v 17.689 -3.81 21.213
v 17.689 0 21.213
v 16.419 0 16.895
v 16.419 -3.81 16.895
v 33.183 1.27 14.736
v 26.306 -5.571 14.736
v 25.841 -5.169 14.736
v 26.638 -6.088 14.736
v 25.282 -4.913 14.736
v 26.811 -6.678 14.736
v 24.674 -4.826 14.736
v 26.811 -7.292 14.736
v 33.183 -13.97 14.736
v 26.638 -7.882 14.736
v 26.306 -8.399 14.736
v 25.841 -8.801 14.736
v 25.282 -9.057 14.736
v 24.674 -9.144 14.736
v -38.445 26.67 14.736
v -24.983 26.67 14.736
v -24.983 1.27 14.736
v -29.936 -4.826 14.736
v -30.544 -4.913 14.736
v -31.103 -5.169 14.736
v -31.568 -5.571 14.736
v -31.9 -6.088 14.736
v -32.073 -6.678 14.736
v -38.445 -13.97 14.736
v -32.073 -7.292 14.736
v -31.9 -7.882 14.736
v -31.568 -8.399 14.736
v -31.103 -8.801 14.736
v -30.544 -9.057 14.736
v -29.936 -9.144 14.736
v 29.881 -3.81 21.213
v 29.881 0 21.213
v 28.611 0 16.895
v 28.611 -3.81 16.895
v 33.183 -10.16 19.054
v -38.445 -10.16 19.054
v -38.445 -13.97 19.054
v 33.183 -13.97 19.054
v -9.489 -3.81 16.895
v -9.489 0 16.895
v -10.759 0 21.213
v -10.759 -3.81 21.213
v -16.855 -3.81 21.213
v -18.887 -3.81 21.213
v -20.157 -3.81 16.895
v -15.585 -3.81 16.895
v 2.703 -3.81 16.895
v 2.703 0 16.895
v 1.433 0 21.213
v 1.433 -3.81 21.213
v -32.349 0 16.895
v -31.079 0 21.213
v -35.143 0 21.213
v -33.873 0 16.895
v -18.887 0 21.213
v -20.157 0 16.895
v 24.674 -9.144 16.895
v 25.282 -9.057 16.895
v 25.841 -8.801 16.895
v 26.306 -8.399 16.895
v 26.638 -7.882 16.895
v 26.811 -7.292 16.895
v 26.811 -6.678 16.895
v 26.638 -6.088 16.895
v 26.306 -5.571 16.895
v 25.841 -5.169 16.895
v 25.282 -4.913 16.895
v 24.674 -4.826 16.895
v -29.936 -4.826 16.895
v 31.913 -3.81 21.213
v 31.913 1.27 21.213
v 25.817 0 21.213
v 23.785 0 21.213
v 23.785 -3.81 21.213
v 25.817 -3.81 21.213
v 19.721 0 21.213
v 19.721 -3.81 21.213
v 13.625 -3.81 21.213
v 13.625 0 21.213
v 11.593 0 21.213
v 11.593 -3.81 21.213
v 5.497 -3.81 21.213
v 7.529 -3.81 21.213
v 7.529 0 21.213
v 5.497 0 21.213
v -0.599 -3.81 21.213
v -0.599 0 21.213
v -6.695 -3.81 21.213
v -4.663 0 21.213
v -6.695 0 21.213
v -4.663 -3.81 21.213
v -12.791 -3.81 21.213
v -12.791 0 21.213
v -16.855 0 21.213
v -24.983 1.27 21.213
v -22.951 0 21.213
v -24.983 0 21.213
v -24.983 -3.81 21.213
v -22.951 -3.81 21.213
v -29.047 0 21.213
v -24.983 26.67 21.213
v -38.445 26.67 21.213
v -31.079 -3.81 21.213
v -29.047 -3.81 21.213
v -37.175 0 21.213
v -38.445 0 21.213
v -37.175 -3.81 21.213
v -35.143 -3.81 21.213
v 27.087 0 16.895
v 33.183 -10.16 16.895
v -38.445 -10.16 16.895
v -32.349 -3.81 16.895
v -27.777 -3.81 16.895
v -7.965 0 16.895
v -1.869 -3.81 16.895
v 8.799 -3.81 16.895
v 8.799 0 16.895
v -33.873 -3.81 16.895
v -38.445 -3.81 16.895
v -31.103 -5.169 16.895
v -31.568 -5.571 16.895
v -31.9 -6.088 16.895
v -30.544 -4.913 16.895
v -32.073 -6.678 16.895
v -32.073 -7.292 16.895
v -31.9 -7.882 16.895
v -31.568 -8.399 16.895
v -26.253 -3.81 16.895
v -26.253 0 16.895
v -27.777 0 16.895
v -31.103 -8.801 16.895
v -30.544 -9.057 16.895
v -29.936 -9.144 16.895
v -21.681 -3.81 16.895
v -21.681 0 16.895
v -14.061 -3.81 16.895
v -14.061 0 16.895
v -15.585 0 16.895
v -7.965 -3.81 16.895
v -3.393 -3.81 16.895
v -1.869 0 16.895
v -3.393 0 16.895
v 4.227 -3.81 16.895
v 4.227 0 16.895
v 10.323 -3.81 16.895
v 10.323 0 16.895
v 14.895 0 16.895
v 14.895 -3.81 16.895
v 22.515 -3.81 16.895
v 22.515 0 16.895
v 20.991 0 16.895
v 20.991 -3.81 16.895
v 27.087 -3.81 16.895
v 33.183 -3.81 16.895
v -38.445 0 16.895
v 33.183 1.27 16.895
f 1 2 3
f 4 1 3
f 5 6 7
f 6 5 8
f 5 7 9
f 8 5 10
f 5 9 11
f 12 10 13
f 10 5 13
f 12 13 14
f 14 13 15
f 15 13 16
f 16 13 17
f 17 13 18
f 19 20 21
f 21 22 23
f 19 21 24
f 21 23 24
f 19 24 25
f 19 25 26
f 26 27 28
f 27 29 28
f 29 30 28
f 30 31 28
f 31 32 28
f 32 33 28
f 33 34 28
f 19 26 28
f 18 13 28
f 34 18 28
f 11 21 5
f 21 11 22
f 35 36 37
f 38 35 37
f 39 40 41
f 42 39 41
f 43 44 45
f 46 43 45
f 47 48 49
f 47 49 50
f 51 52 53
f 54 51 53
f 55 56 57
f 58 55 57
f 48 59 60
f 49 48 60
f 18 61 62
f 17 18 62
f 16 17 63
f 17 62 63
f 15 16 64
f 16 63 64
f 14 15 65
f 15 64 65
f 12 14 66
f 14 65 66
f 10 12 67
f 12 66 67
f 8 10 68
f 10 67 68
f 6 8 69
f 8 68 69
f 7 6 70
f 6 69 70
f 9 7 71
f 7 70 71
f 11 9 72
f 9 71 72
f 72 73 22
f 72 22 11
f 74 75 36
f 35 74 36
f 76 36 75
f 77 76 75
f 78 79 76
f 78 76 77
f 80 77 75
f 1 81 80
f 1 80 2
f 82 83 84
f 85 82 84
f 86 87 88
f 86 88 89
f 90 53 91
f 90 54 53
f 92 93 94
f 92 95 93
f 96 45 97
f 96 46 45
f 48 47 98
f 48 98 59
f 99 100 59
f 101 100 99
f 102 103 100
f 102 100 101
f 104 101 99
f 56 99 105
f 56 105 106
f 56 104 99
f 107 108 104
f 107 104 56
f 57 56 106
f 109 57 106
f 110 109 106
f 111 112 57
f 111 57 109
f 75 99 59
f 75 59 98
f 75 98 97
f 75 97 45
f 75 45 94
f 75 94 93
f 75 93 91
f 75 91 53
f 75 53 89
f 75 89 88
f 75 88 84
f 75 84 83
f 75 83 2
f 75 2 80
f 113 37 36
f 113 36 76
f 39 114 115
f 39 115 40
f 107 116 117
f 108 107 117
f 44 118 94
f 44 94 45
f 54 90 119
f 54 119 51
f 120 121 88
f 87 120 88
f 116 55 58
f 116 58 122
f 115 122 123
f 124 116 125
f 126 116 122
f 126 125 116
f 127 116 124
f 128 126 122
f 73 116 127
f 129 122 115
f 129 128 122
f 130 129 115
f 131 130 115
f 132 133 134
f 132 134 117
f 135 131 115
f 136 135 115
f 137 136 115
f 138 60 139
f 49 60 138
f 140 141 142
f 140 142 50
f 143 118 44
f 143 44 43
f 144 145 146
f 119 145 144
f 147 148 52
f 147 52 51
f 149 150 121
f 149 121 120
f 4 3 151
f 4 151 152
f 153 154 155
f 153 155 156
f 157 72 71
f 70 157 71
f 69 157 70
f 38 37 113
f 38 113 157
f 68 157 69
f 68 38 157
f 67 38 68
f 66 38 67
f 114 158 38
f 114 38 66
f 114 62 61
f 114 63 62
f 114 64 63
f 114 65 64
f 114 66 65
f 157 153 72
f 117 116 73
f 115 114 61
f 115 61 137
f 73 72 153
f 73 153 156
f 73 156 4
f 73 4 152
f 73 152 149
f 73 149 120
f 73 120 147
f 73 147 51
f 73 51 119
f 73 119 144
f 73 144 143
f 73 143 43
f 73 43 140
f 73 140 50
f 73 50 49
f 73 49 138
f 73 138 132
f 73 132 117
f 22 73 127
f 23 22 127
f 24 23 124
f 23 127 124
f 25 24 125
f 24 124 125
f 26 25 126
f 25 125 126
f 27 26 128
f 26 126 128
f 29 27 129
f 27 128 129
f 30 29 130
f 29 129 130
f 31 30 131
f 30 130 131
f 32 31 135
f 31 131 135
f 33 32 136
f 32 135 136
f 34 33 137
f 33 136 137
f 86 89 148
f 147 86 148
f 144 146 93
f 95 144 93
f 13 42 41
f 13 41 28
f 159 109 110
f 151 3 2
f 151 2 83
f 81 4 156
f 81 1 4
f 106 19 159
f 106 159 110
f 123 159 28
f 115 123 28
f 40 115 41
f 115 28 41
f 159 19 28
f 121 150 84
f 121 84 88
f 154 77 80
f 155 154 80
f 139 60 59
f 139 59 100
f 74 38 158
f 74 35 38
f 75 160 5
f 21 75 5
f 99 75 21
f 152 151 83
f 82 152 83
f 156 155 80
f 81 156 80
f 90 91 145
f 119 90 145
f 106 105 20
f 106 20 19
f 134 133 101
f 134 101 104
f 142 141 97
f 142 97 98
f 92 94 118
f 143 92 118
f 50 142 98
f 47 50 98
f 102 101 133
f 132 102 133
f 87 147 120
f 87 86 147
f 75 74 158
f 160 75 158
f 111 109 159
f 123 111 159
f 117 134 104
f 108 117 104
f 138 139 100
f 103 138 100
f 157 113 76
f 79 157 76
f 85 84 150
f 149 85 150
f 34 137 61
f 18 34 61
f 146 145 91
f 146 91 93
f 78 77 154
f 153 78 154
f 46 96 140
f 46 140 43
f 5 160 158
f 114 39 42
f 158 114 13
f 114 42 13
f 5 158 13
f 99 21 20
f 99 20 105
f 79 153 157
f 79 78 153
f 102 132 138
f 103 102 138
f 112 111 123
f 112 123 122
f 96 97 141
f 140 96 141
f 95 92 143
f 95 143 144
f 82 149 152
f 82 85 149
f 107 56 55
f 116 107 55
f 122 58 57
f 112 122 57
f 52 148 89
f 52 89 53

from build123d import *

# Parameters (mm, degrees)
F1_DEPTH  = 3.81
F4_DEPTH  = 71.628
F6_DEPTH  = 1.27
F7_W      = 13.462
F7_H      = 6.477
F8_DEPTH  = 25.4
F9_W      = 54.61
F9_H      = 4.318
F10_DEPTH = 25.4


with BuildPart() as f1:
    # F0 (on Front) → F1 (new body)
    with BuildSketch(Plane.XZ):
        Polygon((-38.4448663006, 16.8945933835), (-38.4448663006, 14.7355933835), (33.1831336994, 14.7355933835), (33.1831336994, 16.8945933835), (28.6111336994, 16.8945933835), (27.0871336994, 16.8945933835), (22.5151336994, 16.8945933835), (20.9911336994, 16.8945933835), (16.4191336994, 16.8945933835), (14.8951336994, 16.8945933835), (10.3231336994, 16.8945933835), (8.7991336994, 16.8945933835), (4.2271336994, 16.8945933835), (2.7031336994, 16.8945933835), (-1.8688663006, 16.8945933835), (-3.3928663006, 16.8945933835), (-7.9648663006, 16.8945933835), (-9.4888663006, 16.8945933835), (-14.0608663006, 16.8945933835), (-15.5848663006, 16.8945933835), (-20.1568663006, 16.8945933835), (-21.6808663006, 16.8945933835), (-26.2528663006, 16.8945933835), (-27.7768663006, 16.8945933835), (-32.3488663006, 16.8945933835), (-33.8728663006, 16.8945933835), align=None)
        Polygon((-37.1748663006, 21.2125933835), (-38.4448663006, 16.8945933835), (-33.8728663006, 16.8945933835), (-35.1428663006, 21.2125933835), align=None)
        Polygon((28.6111336994, 16.8945933835), (33.1831336994, 16.8945933835), (31.9131336994, 21.2125933835), (29.8811336994, 21.2125933835), align=None)
        Polygon((-31.0788663006, 21.2125933835), (-32.3488663006, 16.8945933835), (-27.7768663006, 16.8945933835), (-29.0468663006, 21.2125933835), align=None)
        Polygon((22.5151336994, 16.8945933835), (27.0871336994, 16.8945933835), (25.8171336994, 21.2125933835), (23.7851336994, 21.2125933835), align=None)
        Polygon((-24.9828663006, 21.2125933835), (-26.2528663006, 16.8945933835), (-21.6808663006, 16.8945933835), (-22.9508663006, 21.2125933835), align=None)
        Polygon((16.4191336994, 16.8945933835), (20.9911336994, 16.8945933835), (19.7211336994, 21.2125933835), (17.6891336994, 21.2125933835), align=None)
        Polygon((-18.8868663006, 21.2125933835), (-20.1568663006, 16.8945933835), (-15.5848663006, 16.8945933835), (-16.8548663006, 21.2125933835), align=None)
        Polygon((10.3231336994, 16.8945933835), (14.8951336994, 16.8945933835), (13.6251336994, 21.2125933835), (11.5931336994, 21.2125933835), align=None)
        Polygon((-12.7908663006, 21.2125933835), (-14.0608663006, 16.8945933835), (-9.4888663006, 16.8945933835), (-10.7588663006, 21.2125933835), align=None)
        Polygon((4.2271336994, 16.8945933835), (8.7991336994, 16.8945933835), (7.5291336994, 21.2125933835), (5.4971336994, 21.2125933835), align=None)
        Polygon((-6.6948663006, 21.2125933835), (-7.9648663006, 16.8945933835), (-3.3928663006, 16.8945933835), (-4.6628663006, 21.2125933835), align=None)
        Polygon((-1.8688663006, 16.8945933835), (2.7031336994, 16.8945933835), (1.4331336994, 21.2125933835), (-0.5988663006, 21.2125933835), align=None)
    extrude(amount=F1_DEPTH)

    # F3 (on plane+point) → F4 (join, through all)
    with BuildSketch(Plane.YZ.offset(33.1831336994)):
        Polygon((-13.97, 14.7355933835), (-3.81, 14.7355933835), (-3.81, 16.8945933835), (-10.16, 16.8945933835), (-10.16, 19.0535933835), (-13.97, 19.0535933835), (-13.97, 16.8945933835), align=None)
    extrude(amount=-F4_DEPTH)

    # F5 (on face) → F6 (join)
    with BuildSketch(Plane(origin=(0, 0, 0), x_dir=(-1, 0, 0), z_dir=(0, 1, 0))):
        Polygon((33.8728663006, 16.8945933835), (35.1428663006, 21.2125933835), (31.0788663006, 21.2125933835), (32.3488663006, 16.8945933835), align=None)
        Polygon((27.7768663006, 16.8945933835), (29.0468663006, 21.2125933835), (24.9828663006, 21.2125933835), (26.2528663006, 16.8945933835), align=None)
        Polygon((21.6808663006, 16.8945933835), (22.9508663006, 21.2125933835), (18.8868663006, 21.2125933835), (20.1568663006, 16.8945933835), align=None)
        Polygon((15.5848663006, 16.8945933835), (16.8548663006, 21.2125933835), (12.7908663006, 21.2125933835), (14.0608663006, 16.8945933835), align=None)
        Polygon((9.4888663006, 16.8945933835), (10.7588663006, 21.2125933835), (6.6948663006, 21.2125933835), (7.9648663006, 16.8945933835), align=None)
        Polygon((3.3928663006, 16.8945933835), (4.6628663006, 21.2125933835), (0.5988663006, 21.2125933835), (1.8688663006, 16.8945933835), align=None)
        Polygon((-1.4331336994, 21.2125933835), (-5.4971336994, 21.2125933835), (-4.2271336994, 16.8945933835), (-2.7031336994, 16.8945933835), align=None)
        Polygon((-7.5291336994, 21.2125933835), (-11.5931336994, 21.2125933835), (-10.3231336994, 16.8945933835), (-8.7991336994, 16.8945933835), align=None)
        Polygon((-13.6251336994, 21.2125933835), (-17.6891336994, 21.2125933835), (-16.4191336994, 16.8945933835), (-14.8951336994, 16.8945933835), align=None)
        Polygon((-19.7211336994, 21.2125933835), (-23.7851336994, 21.2125933835), (-22.5151336994, 16.8945933835), (-20.9911336994, 16.8945933835), align=None)
        Polygon((-25.8171336994, 21.2125933835), (-29.8811336994, 21.2125933835), (-28.6111336994, 16.8945933835), (-27.0871336994, 16.8945933835), align=None)
        Polygon((-33.1831336994, 14.7355933835), (38.4448663006, 14.7355933835), (38.4448663006, 16.8945933835), (37.1748663006, 21.2125933835), (35.1428663006, 21.2125933835), (33.8728663006, 16.8945933835), (32.3488663006, 16.8945933835), (31.0788663006, 21.2125933835), (29.0468663006, 21.2125933835), (27.7768663006, 16.8945933835), (26.2528663006, 16.8945933835), (24.9828663006, 21.2125933835), (22.9508663006, 21.2125933835), (21.6808663006, 16.8945933835), (20.1568663006, 16.8945933835), (18.8868663006, 21.2125933835), (16.8548663006, 21.2125933835), (15.5848663006, 16.8945933835), (14.0608663006, 16.8945933835), (12.7908663006, 21.2125933835), (10.7588663006, 21.2125933835), (9.4888663006, 16.8945933835), (7.9648663006, 16.8945933835), (6.6948663006, 21.2125933835), (4.6628663006, 21.2125933835), (3.3928663006, 16.8945933835), (1.8688663006, 16.8945933835), (0.5988663006, 21.2125933835), (-1.4331336994, 21.2125933835), (-2.7031336994, 16.8945933835), (-4.2271336994, 16.8945933835), (-5.4971336994, 21.2125933835), (-7.5291336994, 21.2125933835), (-8.7991336994, 16.8945933835), (-10.3231336994, 16.8945933835), (-11.5931336994, 21.2125933835), (-13.6251336994, 21.2125933835), (-14.8951336994, 16.8945933835), (-16.4191336994, 16.8945933835), (-17.6891336994, 21.2125933835), (-19.7211336994, 21.2125933835), (-20.9911336994, 16.8945933835), (-22.5151336994, 16.8945933835), (-23.7851336994, 21.2125933835), (-25.8171336994, 21.2125933835), (-27.0871336994, 16.8945933835), (-28.6111336994, 16.8945933835), (-29.8811336994, 21.2125933835), (-31.9131336994, 21.2125933835), (-33.1831336994, 16.8945933835), align=None)
        Polygon((37.1748663006, 21.2125933835), (38.4448663006, 16.8945933835), (38.4448663006, 21.2125933835), align=None)
    extrude(amount=F6_DEPTH)

    # F7 (on face) → F8 (join)
    with BuildSketch(Plane(origin=(0, 1.27, 0), x_dir=(-1, 0, 0), z_dir=(0, 1, 0))):
        with Locations((31.7138663006, 17.9740933835)):
            Rectangle(F7_W, F7_H)
    extrude(amount=F8_DEPTH)

    # F9 (on face) → F10 (cut)
    with BuildSketch(Plane.XY.offset(16.8945933835)):
        with Locations((-2.6308663007, -6.985)):
            Rectangle(F9_W, F9_H)
        with BuildLine():
            Line((24.6741336994, -4.826), (24.6741336994, -9.144))
            ThreePointArc((24.6741336994, -9.144), (26.8331336994, -6.985), (24.6741336994, -4.826))
        make_face()
        with BuildLine():
            ThreePointArc((-29.9358663007, -4.826), (-32.0948663007, -6.985), (-29.9358663007, -9.144))
            Line((-29.9358663007, -9.144), (-29.9358663007, -4.826))
        make_face()
    extrude(amount=-F10_DEPTH, mode=Mode.SUBTRACT)


solid = f1.part
